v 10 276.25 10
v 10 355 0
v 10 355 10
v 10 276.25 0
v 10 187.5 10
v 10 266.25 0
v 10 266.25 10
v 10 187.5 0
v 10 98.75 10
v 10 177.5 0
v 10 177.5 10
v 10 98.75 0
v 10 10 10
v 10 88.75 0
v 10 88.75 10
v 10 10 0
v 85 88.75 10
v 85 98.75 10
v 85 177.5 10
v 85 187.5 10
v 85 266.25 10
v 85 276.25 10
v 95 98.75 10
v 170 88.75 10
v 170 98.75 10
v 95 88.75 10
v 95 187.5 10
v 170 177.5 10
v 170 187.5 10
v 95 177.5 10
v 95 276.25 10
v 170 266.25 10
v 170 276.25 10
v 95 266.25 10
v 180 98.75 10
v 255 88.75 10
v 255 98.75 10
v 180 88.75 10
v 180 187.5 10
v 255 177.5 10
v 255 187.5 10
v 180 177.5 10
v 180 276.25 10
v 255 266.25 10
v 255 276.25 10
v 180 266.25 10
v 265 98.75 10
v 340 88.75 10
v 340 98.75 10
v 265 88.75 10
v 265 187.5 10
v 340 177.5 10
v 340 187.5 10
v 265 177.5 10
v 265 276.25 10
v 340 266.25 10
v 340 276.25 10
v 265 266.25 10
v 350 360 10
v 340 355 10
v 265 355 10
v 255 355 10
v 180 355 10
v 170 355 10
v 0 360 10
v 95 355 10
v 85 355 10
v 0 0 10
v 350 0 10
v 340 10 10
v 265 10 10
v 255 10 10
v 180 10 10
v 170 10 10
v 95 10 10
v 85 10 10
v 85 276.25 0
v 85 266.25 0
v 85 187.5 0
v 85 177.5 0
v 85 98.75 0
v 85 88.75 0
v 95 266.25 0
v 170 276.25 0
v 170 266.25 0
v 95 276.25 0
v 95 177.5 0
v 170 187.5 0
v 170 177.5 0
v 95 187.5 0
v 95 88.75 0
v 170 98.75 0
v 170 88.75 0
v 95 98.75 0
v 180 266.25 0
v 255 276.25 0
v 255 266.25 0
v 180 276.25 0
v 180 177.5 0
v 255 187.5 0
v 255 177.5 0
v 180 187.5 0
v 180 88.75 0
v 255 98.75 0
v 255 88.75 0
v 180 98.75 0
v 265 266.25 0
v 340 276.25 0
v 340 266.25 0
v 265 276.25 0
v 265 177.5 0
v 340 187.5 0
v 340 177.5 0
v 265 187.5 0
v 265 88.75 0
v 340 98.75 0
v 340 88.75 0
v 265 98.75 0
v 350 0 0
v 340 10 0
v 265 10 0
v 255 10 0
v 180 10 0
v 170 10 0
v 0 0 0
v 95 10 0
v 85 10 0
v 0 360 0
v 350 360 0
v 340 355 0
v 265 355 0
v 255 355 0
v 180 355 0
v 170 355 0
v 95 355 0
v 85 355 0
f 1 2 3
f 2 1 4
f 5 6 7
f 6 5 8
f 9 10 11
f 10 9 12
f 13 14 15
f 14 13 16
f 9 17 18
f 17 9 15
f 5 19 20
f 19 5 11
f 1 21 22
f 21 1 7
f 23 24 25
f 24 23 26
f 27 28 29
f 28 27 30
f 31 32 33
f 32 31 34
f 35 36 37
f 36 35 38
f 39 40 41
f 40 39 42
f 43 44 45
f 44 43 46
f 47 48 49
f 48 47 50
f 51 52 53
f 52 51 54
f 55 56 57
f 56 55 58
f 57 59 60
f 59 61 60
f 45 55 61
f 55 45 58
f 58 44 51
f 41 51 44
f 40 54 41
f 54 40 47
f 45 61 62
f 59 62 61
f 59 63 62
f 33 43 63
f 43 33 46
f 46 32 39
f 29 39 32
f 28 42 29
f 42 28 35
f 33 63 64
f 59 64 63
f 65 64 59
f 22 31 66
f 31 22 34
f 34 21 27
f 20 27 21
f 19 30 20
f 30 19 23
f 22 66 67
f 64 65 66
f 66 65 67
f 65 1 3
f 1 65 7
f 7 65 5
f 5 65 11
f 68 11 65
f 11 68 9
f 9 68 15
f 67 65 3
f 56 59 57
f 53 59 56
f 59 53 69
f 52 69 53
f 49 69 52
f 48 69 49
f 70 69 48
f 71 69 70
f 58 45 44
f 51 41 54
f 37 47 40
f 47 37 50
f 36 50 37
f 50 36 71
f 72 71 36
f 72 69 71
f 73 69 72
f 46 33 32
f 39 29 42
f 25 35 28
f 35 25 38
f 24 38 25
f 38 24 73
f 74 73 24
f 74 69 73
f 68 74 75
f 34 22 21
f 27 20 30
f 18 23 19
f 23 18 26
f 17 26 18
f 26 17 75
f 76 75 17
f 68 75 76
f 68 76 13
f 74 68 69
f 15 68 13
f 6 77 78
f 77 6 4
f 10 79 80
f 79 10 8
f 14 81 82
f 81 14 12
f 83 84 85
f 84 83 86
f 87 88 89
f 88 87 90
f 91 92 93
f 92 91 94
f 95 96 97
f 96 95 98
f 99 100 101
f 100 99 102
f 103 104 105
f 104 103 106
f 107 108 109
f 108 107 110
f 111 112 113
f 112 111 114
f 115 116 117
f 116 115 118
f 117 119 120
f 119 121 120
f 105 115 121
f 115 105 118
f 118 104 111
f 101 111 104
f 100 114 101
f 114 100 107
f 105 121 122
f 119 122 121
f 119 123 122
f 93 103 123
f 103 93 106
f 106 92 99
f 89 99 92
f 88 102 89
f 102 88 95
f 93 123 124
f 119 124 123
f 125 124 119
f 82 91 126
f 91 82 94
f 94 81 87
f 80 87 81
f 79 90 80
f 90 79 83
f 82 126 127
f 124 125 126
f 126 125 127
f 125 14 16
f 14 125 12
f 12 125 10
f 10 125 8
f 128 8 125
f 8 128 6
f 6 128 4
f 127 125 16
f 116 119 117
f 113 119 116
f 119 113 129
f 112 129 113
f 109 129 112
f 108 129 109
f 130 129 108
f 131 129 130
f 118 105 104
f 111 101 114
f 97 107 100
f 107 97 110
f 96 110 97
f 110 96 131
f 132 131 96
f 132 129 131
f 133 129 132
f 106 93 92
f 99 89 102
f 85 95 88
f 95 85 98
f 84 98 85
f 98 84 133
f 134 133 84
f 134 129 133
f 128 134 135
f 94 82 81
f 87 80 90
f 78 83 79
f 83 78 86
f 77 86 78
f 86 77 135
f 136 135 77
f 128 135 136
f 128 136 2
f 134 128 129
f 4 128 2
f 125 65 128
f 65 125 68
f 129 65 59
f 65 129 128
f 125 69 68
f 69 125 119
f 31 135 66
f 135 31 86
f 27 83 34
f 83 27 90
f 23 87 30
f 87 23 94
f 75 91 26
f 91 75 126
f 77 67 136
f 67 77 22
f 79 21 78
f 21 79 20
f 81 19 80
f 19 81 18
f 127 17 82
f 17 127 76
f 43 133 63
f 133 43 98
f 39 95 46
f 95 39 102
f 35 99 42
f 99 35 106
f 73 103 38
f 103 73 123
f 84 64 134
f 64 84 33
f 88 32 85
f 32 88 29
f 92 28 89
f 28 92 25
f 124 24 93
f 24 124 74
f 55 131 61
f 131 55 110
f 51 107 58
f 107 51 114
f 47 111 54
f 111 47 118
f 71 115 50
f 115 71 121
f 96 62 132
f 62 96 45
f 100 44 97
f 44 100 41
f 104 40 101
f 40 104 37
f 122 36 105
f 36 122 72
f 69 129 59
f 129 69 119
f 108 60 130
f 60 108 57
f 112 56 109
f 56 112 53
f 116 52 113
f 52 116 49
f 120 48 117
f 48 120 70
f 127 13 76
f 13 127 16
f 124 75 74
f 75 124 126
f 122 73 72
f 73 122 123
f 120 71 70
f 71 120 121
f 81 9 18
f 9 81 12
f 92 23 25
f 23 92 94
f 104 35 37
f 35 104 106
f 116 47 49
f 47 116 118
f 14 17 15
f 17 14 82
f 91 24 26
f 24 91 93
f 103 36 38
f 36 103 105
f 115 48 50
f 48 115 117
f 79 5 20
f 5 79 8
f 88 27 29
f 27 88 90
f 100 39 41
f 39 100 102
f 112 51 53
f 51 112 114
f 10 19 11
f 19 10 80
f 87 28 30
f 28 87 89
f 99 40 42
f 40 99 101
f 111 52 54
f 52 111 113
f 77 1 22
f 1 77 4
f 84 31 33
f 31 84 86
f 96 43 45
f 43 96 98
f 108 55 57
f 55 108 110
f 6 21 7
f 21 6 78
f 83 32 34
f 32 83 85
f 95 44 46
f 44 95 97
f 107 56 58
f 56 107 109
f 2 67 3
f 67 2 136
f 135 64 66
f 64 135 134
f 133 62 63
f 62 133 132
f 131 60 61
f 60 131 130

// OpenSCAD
// face_band.scad
// A face band (350 x 360 x 10) with a rectangular grid of 10 mm square bars
// Model coordinates: X = 350 (width), Y = 360 (band height), Z = 10 (thickness). The part lies flat on Z=0.

width = 350;
band_h = 360; // half the full 720 height
thk = 10;

// horizontal full-face spacing is computed for the full 720 mm height (so that two bands align)
full_height = 720;
h_bar_count = 9; // number of horizontal bars across full height (bars = h_bar_count)
h_gap = (full_height - h_bar_count * thk) / (h_bar_count - 1); // 78.75 mm

// vertical spacing across the 350 mm internal width
v_gap_count = 4; // number of gaps
v_bars = v_gap_count + 1; // 5 bars
v_gap = (width - v_bars * thk) / v_gap_count; // 75 mm

$fn = 32;

module face_band(w=width, bh=band_h, t=thk) {
    union() {
        // bounding band box (we will place bars inside this)
        // vertical bars (along Y direction for the band)
        for (i = [0 : v_bars - 1]) {
            x = i * (t + v_gap);
            translate([x, 0, 0]) cube([t, bh, t]);
        }

        // horizontal bars: they are placed as if across full 720 height, then the band is the subset
        for (j = [0 : h_bar_count - 1]) {
            y_full = j * (t + h_gap); // This is the Y location along the full 720 height
            // include the portion of that bar that overlaps this band (band is from y=0..bh in local coordinates)
            // We'll compute overlap
            if (y_full < bh && (y_full + t) > 0) {
                // portion within this band's local Y span
                y_local = max(0, y_full);
                // For simplicity we place the bar limited to the band extents by intersection with a crop cube
                intersection() {
                    translate([0, y_full, 0]) cube([w, t, t]);
                    translate([0, 0, 0]) cube([w, bh, t]);
                }
            }
        }
    }
}

face_band();
